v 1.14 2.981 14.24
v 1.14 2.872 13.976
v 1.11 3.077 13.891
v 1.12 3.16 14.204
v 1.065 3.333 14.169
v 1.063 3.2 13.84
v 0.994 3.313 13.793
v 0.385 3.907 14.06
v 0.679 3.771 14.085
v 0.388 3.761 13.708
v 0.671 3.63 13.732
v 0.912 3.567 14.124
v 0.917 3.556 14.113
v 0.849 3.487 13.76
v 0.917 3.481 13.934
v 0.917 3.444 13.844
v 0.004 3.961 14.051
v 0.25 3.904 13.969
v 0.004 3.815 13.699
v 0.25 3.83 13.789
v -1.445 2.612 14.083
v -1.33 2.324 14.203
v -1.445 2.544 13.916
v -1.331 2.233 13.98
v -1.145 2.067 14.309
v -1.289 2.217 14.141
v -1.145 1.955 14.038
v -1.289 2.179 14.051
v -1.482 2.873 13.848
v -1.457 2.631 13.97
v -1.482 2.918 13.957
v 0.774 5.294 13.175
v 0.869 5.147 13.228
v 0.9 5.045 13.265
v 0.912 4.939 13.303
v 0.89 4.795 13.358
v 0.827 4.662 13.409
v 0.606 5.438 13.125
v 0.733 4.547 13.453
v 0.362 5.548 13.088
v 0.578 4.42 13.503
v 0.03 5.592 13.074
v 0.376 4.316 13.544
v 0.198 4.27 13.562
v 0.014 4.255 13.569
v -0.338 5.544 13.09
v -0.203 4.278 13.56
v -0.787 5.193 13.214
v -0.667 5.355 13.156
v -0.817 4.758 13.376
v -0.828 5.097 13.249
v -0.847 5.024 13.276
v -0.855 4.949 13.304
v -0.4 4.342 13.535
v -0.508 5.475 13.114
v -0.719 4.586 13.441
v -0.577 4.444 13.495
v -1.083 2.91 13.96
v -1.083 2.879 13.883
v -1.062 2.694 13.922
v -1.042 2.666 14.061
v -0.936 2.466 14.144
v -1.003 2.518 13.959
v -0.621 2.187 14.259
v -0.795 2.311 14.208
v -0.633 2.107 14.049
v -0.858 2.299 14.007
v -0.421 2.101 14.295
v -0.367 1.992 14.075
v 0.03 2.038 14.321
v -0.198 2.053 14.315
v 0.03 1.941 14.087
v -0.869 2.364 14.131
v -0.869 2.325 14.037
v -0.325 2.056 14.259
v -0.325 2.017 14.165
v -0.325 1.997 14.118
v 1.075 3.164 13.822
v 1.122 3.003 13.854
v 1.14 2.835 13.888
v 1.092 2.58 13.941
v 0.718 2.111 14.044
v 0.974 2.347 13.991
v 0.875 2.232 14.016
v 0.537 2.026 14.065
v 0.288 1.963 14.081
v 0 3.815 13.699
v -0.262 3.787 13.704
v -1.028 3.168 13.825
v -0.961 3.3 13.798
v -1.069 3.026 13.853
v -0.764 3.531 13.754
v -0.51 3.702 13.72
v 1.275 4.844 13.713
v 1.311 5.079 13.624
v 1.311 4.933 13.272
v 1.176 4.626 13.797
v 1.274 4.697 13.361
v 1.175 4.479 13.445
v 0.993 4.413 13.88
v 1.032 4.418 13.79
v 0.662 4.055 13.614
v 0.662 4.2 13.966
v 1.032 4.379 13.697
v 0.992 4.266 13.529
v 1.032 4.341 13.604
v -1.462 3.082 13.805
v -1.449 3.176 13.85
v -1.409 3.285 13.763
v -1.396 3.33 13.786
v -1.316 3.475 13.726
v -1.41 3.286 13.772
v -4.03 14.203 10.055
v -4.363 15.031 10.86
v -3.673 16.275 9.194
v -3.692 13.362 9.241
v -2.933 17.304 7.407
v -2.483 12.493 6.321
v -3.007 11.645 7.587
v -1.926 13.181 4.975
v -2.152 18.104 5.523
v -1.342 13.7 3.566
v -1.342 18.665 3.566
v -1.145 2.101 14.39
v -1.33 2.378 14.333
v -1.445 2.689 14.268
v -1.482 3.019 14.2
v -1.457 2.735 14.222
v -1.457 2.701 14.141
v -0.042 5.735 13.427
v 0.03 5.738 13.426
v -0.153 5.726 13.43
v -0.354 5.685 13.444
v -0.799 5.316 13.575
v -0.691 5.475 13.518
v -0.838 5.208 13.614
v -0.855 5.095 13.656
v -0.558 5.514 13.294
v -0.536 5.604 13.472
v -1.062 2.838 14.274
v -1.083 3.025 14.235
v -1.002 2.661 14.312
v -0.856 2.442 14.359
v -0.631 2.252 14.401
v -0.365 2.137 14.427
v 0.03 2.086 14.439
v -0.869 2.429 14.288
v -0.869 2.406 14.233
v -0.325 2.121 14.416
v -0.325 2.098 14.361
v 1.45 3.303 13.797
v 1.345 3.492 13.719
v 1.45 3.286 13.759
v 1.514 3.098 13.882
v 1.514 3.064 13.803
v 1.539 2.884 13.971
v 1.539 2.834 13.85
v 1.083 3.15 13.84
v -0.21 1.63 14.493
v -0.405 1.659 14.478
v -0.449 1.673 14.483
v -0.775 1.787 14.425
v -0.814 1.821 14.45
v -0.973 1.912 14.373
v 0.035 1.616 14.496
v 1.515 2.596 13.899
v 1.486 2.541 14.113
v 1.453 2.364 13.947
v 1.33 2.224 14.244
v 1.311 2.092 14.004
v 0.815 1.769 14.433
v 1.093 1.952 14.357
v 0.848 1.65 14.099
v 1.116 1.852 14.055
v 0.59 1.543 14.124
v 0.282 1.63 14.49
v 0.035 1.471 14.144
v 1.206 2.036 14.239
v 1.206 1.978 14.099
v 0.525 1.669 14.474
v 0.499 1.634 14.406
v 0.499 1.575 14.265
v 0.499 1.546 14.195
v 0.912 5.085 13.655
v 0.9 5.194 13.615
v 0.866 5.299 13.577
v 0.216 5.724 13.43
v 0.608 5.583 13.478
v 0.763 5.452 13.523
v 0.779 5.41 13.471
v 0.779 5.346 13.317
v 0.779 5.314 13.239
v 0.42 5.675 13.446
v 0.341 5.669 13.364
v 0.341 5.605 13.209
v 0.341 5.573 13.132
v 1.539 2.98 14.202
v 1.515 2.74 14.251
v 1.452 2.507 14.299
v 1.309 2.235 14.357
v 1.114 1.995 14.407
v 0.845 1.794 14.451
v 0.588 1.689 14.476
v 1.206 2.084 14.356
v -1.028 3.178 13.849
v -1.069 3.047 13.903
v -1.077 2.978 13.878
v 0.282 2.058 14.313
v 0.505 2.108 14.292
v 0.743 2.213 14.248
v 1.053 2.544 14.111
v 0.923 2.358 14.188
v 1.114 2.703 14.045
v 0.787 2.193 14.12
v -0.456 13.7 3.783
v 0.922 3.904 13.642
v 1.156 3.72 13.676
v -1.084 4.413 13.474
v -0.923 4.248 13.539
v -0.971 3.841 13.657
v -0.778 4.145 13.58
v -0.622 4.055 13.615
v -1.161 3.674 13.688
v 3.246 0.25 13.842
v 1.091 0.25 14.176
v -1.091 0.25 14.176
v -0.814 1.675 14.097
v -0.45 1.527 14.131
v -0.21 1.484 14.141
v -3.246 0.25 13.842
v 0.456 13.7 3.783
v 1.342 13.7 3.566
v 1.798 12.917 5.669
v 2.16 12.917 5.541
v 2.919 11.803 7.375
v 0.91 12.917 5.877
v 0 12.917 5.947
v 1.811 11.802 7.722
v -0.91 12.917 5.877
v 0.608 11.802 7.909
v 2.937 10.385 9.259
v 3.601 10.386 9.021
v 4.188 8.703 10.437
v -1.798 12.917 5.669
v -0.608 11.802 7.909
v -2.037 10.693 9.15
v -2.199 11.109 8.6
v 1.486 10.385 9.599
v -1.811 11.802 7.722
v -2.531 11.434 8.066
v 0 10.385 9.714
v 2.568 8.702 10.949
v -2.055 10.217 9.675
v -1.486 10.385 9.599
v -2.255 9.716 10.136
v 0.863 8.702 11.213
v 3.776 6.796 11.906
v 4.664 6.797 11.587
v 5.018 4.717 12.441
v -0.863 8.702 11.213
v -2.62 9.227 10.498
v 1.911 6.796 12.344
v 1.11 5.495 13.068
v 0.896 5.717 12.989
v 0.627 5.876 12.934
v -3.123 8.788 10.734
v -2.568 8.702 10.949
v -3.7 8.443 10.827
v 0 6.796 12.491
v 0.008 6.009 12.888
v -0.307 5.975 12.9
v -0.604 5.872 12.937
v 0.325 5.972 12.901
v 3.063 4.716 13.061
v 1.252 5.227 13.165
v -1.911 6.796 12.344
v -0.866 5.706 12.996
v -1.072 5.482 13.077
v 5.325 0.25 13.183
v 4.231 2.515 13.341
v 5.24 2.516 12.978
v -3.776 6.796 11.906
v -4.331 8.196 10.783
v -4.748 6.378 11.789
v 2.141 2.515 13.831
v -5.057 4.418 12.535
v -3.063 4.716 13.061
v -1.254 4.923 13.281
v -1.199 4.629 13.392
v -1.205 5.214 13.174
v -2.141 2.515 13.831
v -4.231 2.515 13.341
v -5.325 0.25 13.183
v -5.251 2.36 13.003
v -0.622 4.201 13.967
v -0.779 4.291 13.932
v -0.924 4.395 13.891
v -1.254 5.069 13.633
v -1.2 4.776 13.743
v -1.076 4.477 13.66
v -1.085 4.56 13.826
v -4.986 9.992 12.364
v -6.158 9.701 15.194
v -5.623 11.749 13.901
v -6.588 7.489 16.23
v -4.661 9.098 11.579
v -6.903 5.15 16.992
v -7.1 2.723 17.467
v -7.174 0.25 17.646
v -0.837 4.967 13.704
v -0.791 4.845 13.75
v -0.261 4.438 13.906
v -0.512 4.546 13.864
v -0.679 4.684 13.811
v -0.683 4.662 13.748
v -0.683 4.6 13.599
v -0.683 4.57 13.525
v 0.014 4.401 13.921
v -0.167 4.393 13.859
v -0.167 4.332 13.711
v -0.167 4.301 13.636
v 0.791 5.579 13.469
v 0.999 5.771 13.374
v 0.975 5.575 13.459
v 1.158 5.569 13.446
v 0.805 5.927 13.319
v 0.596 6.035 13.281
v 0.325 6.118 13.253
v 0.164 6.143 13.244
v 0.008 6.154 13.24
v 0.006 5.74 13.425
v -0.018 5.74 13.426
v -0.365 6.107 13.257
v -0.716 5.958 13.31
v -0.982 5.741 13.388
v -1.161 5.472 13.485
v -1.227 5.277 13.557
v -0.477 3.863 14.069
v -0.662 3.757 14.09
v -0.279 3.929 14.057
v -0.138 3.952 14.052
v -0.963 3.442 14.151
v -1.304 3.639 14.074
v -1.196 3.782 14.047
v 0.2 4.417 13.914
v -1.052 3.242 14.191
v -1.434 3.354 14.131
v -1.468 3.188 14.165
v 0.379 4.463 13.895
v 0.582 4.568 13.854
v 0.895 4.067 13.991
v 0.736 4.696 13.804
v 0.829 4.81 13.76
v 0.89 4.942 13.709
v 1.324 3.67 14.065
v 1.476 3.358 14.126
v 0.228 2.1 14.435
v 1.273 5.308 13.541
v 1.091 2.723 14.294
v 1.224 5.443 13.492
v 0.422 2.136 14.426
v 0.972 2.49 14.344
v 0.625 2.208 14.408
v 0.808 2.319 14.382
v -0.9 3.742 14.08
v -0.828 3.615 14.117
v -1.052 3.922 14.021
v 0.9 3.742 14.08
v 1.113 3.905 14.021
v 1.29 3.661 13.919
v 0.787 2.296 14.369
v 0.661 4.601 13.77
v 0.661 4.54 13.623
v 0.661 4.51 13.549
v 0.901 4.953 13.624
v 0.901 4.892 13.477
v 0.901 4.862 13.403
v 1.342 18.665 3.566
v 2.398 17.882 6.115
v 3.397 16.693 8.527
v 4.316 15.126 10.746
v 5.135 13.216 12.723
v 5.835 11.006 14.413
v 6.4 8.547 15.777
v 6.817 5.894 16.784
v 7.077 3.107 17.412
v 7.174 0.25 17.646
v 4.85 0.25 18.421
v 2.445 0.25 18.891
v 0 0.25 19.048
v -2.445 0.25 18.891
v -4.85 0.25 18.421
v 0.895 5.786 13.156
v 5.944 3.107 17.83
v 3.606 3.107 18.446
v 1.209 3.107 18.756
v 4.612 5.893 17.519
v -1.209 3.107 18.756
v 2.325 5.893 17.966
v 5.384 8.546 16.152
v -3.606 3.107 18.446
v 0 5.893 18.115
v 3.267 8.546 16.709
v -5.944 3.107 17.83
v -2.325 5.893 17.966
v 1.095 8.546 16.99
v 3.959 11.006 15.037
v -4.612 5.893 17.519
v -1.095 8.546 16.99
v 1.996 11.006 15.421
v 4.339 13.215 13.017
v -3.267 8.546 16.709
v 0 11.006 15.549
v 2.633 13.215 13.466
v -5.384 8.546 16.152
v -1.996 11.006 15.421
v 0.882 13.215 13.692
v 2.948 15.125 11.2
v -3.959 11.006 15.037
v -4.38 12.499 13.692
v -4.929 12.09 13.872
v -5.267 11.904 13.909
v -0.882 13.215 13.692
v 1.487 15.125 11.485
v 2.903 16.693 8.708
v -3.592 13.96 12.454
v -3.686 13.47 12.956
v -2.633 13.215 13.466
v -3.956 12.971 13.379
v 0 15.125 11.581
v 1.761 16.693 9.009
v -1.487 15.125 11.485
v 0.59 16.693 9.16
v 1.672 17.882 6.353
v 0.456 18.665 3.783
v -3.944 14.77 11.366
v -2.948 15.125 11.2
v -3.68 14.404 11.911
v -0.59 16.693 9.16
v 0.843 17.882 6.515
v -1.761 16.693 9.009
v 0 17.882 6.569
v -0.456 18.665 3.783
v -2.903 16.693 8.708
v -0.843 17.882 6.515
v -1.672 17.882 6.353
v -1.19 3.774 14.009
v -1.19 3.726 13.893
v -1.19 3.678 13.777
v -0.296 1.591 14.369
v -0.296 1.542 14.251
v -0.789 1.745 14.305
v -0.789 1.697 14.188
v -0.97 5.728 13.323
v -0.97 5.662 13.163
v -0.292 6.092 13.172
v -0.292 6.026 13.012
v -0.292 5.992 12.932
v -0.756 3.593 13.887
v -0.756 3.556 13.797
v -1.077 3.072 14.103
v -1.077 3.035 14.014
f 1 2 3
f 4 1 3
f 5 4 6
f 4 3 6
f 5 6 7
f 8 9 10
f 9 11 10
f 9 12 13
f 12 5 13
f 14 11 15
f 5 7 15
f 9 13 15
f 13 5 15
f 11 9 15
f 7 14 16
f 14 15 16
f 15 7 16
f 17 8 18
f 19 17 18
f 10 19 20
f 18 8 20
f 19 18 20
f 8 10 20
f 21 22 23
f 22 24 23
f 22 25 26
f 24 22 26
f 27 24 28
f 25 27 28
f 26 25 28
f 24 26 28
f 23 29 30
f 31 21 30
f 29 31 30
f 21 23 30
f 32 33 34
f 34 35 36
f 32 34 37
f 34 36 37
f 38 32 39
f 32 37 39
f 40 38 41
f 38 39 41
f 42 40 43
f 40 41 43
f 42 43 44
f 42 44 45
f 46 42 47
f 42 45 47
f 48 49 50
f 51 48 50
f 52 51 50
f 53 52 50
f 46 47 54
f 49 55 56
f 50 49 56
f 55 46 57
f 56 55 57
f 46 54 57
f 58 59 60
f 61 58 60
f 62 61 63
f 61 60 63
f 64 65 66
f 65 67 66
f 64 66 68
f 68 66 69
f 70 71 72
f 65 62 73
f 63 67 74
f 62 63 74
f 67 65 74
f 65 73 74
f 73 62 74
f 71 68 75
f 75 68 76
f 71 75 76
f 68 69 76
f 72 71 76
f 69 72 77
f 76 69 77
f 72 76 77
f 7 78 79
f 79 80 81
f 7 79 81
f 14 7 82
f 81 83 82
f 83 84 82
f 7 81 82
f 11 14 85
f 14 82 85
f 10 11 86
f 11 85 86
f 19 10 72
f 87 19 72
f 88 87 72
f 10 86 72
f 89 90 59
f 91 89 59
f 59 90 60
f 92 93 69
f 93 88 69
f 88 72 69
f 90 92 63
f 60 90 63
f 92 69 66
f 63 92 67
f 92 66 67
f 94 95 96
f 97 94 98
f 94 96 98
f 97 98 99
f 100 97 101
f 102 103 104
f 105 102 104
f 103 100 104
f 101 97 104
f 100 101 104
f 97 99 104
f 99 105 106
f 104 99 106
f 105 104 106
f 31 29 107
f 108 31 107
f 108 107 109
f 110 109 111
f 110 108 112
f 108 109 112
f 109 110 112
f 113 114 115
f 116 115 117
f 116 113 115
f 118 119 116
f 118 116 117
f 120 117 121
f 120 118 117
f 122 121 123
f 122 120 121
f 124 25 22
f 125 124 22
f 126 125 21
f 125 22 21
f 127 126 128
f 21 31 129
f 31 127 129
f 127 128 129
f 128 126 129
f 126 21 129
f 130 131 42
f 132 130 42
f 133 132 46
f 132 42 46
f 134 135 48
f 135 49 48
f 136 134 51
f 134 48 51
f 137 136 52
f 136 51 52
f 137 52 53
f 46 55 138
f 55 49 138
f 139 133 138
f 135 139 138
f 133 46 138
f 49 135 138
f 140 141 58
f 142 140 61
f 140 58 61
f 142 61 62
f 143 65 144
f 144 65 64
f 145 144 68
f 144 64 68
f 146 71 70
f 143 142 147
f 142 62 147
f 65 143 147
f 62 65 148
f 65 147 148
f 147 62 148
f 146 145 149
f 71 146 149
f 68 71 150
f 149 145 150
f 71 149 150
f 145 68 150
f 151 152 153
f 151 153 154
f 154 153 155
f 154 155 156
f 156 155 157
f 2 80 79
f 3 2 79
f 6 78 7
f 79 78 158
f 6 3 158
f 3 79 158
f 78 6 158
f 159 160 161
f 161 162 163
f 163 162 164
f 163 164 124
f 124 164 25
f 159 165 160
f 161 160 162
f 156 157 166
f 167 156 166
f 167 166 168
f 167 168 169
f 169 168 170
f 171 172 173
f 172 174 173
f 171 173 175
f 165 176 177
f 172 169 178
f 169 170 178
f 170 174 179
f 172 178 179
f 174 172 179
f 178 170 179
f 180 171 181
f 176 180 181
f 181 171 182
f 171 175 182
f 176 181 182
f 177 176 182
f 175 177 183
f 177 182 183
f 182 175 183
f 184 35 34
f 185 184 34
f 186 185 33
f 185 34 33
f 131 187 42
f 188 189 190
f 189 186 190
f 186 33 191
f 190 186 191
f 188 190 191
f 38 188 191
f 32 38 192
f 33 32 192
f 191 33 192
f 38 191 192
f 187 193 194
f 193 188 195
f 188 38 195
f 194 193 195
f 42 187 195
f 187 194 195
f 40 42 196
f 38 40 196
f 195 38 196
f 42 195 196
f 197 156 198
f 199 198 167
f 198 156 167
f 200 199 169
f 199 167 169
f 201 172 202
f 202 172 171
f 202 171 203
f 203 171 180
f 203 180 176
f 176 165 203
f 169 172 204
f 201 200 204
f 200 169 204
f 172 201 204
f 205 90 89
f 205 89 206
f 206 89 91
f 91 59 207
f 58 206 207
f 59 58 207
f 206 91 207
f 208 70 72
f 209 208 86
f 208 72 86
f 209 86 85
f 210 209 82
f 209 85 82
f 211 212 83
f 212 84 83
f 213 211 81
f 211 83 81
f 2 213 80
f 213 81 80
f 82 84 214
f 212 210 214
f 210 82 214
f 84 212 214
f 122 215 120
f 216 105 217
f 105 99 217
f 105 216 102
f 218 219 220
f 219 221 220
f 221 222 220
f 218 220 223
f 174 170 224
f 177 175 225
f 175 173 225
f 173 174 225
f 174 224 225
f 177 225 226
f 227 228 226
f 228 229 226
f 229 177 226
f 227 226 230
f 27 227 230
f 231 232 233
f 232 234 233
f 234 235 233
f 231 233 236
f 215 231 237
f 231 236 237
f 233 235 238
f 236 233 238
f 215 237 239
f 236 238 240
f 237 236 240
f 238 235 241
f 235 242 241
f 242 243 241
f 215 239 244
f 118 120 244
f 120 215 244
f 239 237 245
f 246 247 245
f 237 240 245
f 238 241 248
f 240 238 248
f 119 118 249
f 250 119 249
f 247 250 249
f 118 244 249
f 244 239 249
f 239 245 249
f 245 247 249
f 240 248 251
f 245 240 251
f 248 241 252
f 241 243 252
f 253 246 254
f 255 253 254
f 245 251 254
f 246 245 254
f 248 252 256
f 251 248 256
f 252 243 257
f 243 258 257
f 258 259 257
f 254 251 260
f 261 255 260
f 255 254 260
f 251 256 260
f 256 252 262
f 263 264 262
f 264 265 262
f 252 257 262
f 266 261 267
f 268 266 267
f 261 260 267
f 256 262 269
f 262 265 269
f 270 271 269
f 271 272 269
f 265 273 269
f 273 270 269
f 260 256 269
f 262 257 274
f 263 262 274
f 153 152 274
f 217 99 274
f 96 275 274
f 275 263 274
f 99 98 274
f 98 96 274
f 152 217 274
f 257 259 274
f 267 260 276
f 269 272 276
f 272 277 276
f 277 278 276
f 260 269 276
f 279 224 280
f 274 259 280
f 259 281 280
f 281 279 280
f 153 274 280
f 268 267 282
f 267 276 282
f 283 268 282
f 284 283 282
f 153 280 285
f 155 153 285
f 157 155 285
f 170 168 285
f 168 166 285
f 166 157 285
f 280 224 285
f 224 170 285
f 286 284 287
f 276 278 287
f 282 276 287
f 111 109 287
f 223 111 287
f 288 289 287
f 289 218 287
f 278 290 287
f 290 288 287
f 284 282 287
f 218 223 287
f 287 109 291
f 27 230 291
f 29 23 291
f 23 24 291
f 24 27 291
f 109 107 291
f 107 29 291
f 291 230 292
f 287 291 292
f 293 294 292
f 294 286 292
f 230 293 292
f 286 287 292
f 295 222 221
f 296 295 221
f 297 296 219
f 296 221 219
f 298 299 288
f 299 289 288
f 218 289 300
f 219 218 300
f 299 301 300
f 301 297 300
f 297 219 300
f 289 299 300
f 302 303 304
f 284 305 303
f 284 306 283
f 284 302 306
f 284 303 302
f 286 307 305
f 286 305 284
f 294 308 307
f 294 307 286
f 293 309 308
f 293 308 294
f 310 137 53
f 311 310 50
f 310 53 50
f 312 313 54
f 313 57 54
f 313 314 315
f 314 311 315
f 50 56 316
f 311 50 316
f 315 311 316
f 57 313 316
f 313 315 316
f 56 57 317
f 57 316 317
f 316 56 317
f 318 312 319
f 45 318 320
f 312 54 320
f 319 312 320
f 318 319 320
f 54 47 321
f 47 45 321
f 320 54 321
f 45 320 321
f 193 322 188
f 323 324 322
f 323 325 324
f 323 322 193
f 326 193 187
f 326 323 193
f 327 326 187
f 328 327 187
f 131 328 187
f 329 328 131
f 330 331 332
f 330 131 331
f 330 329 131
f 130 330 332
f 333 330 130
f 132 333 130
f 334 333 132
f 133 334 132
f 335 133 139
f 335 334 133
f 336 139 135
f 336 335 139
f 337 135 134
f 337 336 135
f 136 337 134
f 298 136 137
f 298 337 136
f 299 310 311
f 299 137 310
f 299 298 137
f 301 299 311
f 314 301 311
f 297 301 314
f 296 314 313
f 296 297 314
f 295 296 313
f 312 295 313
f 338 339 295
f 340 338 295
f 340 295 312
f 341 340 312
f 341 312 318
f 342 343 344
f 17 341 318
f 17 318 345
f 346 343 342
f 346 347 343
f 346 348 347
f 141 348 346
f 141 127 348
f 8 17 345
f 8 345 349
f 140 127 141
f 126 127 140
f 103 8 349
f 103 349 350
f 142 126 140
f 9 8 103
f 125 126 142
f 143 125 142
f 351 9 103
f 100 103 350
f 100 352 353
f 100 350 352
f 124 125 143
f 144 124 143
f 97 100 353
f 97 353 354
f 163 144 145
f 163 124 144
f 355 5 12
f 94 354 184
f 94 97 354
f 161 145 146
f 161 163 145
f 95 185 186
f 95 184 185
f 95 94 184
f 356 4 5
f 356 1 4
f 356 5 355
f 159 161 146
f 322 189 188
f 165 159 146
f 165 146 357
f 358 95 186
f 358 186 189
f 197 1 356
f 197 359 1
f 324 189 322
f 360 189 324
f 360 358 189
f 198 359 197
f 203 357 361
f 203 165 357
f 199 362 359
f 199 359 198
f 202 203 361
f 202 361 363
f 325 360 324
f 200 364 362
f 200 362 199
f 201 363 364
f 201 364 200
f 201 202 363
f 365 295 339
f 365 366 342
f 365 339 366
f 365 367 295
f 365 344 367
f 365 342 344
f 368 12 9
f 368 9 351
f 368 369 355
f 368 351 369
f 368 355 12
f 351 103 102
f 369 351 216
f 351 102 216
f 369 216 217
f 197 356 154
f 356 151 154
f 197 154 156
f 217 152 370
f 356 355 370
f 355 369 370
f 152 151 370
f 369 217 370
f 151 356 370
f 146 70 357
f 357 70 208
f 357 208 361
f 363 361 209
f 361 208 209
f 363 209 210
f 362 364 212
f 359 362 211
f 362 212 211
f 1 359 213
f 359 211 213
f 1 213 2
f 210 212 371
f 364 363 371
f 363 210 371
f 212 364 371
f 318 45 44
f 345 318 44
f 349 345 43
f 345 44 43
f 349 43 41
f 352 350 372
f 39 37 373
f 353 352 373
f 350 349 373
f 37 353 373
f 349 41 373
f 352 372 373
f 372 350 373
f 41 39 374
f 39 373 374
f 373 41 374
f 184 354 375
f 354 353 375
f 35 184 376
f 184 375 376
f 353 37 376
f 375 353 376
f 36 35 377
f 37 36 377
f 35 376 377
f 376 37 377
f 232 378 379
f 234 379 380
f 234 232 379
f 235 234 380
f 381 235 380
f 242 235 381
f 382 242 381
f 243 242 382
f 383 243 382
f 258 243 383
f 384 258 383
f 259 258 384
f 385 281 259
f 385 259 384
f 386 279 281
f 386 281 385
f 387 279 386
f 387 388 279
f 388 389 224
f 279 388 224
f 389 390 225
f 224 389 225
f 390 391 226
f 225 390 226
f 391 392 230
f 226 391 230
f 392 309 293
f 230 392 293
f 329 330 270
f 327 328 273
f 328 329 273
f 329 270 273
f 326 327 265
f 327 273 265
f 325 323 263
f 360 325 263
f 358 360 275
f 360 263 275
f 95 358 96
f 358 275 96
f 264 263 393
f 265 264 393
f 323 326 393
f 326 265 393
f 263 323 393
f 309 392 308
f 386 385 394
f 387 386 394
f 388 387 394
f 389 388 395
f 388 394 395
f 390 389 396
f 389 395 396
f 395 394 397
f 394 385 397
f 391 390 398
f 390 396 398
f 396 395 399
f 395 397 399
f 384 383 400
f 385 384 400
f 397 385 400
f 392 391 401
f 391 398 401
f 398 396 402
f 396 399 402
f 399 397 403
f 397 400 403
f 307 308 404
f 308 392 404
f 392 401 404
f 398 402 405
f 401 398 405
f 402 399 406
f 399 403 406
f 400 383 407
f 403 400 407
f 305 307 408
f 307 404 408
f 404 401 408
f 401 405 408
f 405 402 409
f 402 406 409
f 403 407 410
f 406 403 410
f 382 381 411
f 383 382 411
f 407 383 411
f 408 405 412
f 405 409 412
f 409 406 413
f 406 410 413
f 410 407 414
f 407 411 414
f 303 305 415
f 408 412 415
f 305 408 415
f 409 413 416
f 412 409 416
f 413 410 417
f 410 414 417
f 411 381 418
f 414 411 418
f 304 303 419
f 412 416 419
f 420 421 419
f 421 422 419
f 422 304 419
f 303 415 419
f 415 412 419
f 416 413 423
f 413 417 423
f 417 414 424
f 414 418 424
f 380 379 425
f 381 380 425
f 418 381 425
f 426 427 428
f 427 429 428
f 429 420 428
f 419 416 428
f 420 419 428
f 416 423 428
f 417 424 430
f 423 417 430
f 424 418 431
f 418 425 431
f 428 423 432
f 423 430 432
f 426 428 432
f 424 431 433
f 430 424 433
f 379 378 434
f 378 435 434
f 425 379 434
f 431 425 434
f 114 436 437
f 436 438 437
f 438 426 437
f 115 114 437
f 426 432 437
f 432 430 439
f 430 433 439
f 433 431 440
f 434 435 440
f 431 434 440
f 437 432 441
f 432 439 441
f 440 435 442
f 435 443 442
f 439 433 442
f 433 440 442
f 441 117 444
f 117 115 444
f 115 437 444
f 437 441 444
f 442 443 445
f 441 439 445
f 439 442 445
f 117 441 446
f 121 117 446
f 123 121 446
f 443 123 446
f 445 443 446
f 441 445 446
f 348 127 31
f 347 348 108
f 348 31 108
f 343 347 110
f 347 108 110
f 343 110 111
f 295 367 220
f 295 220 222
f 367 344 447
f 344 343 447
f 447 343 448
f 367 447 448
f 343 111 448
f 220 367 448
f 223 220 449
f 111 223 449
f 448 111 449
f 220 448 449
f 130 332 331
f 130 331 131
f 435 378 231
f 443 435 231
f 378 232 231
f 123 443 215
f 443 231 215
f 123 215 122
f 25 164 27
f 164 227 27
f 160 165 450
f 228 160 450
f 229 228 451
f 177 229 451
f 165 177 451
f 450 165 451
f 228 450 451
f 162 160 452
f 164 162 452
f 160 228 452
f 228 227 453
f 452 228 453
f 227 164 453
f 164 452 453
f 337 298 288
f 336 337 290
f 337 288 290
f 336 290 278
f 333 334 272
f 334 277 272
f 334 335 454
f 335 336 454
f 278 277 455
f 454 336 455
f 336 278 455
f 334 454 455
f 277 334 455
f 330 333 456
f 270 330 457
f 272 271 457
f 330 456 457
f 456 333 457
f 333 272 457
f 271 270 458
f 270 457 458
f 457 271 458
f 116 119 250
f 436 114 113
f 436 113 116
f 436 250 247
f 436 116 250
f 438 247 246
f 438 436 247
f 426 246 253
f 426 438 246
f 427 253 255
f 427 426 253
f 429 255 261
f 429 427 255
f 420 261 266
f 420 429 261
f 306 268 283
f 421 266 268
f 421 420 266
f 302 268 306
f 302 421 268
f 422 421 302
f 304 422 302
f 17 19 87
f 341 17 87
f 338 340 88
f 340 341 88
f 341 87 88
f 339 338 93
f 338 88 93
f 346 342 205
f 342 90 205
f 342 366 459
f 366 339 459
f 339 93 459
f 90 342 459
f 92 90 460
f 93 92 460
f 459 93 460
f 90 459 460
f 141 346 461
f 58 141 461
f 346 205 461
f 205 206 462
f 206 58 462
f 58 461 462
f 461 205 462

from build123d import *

# Parameters (mm, degrees)
REVOLVE1_ANGLE          = 45
CUT_EXTRUDE1_DEPTH      = 28.647117169
CUT_EXTRUDE1_DEPTH_BACK = 28.647117169
CUT_EXTRUDE4_START      = 8.537277035
CUT_EXTRUDE4_DEPTH      = 5.473576564
CUT_EXTRUDE4_START_2    = 14.010853599
CUT_EXTRUDE4_2_DEPTH    = 0.589178544
CUT_EXTRUDE5_DEPTH      = 28.732730484
CUT_EXTRUDE5_DEPTH_BACK = 28.732730484
SKETCH9_R               = 2.6035


with BuildPart() as part:
    # Sketch1 → Revolve1 (revolve, symmetric)
    with BuildSketch(Plane(origin=(0, 0, 0), x_dir=(0, 0, -1), z_dir=(1, 0, 0))) as revolve1_sk:
        with BuildLine():
            Line((-14.217802221, 0.25), (-19.048359509, 0.25))
            ThreePointArc((-19.048359509, 0.25), (-14.676690222, 12.144845166), (-3.81, 18.66511184))
            Line((-3.81, 18.66511184), (-3.81, 13.700083941))
            ThreePointArc((-3.81, 13.700083941), (-11.246181696, 8.70240181), (-14.217802221, 0.25))
        make_face()
    revolve(axis=Axis((0, 0, 0), (0, 1, 0)), revolution_arc=REVOLVE1_ANGLE / 2)
    revolve(revolve1_sk.sketch, axis=Axis((0, 0, 0), (0, -1, 0)), revolution_arc=REVOLVE1_ANGLE / 2)

    # Sketch2 → Cut-Extrude1 (cut, two sides: drawn at the far end of the back side and taken through both)
    with BuildSketch(Plane(origin=(0, 0, 0), x_dir=(1, 0, 0), z_dir=(0, 1, 0)).offset(-CUT_EXTRUDE1_DEPTH_BACK)):
        with BuildLine():
            Line((7.289491598, -17.598389479), (1.458023877, -3.519981019))
            ThreePointArc((1.458023877, -3.519981019), (1.400077392, -3.543428184), (1.341754023, -3.5659215))
            Line((1.341754023, -3.5659215), (7.173849701, -17.645845983))
            ThreePointArc((7.173849701, -17.645845983), (7.231709577, -17.622212591), (7.289491598, -17.598389479))
        make_face()
        with BuildLine():
            Line((-7.173849701, -17.645845983), (-1.341754023, -3.5659215))
            ThreePointArc((-1.341754023, -3.5659215), (-1.400077392, -3.543428184), (-1.458023877, -3.519981019))
            Line((-1.458023877, -3.519981019), (-7.289491598, -17.598389479))
            ThreePointArc((-7.289491598, -17.598389479), (-7.231709577, -17.622212591), (-7.173849701, -17.645845983))
        make_face()
    extrude(amount=CUT_EXTRUDE1_DEPTH + CUT_EXTRUDE1_DEPTH_BACK, mode=Mode.SUBTRACT)

    # Cut-Extrude4: read off the stored shape, not the designer's step
    # Cut-Extrude4 outline → Cut-Extrude4 (cut)
    with BuildSketch(Plane(origin=(0, 0, 0), x_dir=(-1, 0, 0), z_dir=(0, 0.3826834323650899, 0.9238795325112868)).offset(CUT_EXTRUDE4_START)):
        with BuildLine():
            add(Edge.make_bspline(
                [(1.145086138, 3.565969106), (1.19745992, 3.501753358), (1.247244242, 3.434878944), (1.289054738, 3.363552137), (1.36987604, 3.225674665), (1.42881214, 3.072360327), (1.457196317, 2.91577175), (1.47334903, 2.826661179), (1.4796055, 2.735818699), (1.481666667, 2.645269988)],
                knots=[0, 0, 0, 0, 0.246790042, 0.246790042, 0.246790042, 0.728901446, 0.728901446, 0.728901446, 1, 1, 1, 1], degree=3))
            add(Edge.make_bspline(
                [(-0.034726562, 4.053921831), (0.07575388, 4.051019144), (0.186778995, 4.046395579), (0.295874255, 4.028901651), (0.467443739, 4.001389693), (0.637906375, 3.946400478), (0.789002935, 3.861831747), (0.924097327, 3.786219427), (1.04145298, 3.67986749), (1.145086138, 3.565969106)],
                knots=[0, 0, 0, 0, 0.249295942, 0.249295942, 0.249295942, 0.645680683, 0.645680683, 0.645680683, 1, 1, 1, 1], degree=3))
            add(Edge.make_bspline(
                [(-1.538653846, 2.681777399), (-1.533984641, 2.841390676), (-1.509995079, 3.003784016), (-1.452444081, 3.153169647), (-1.394735889, 3.302963304), (-1.308458263, 3.44367736), (-1.206069907, 3.568297055), (-1.117554458, 3.676031652), (-1.011064819, 3.772567587), (-0.891455892, 3.845919508), (-0.771642392, 3.919396885), (-0.636486792, 3.970759294), (-0.499275438, 4.003497061), (-0.34783736, 4.039629235), (-0.190448958, 4.050094147), (-0.034726562, 4.053921831)],
                knots=[0, 0, 0, 0, 0.213488165, 0.213488165, 0.213488165, 0.426876737, 0.426876737, 0.426876737, 0.611615857, 0.611615857, 0.611615857, 0.79654204, 0.79654204, 0.79654204, 1, 1, 1, 1], degree=3))
            add(Edge.make_bspline(
                [(-0.661585537, 1.463676438), (-0.899774904, 1.586484198), (-1.128226559, 1.734488753), (-1.451046171, 2.153494958), (-1.532392107, 2.415727364), (-1.538653846, 2.681777399)],
                knots=[0, 0, 0, 0, 0.5, 0.5, 1, 1, 1, 1], degree=3))
            add(Edge.make_bspline(
                [(-1.310705128, 0.521607127), (-1.305904516, 0.65367332), (-1.280862157, 0.788593254), (-1.226377368, 0.909035745), (-1.178829711, 1.014143213), (-1.111903507, 1.112084922), (-1.032368876, 1.195678848), (-0.952782866, 1.279326774), (-0.859002662, 1.350529079), (-0.759375758, 1.408896603), (-0.727137868, 1.427783528), (-0.694356407, 1.445732495), (-0.661585537, 1.463676438)],
                knots=[0, 0, 0, 0, 0.332551925, 0.332551925, 0.332551925, 0.620515921, 0.620515921, 0.620515921, 0.907833434, 0.907833434, 0.907833434, 1, 1, 1, 1], degree=3))
            add(Edge.make_bspline(
                [(-0.008013822, -0.619026887), (-0.329093033, -0.609182757), (-0.647556074, -0.51508889), (-1.142511109, -0.108023215), (-1.296474915, 0.197661831), (-1.310705128, 0.521607127)],
                knots=[0, 0, 0, 0, 0.5, 0.5, 1, 1, 1, 1], degree=3))
            add(Edge.make_bspline(
                [(1.253717949, 0.534073073), (1.248106847, 0.402186726), (1.226592659, 0.268072734), (1.177956097, 0.145346109), (1.129145328, 0.022179899), (1.058406248, -0.094576574), (0.970426594, -0.19366506), (0.885346609, -0.289487746), (0.783549843, -0.372494682), (0.672886827, -0.437179025), (0.555024512, -0.506071477), (0.425013252, -0.557408464), (0.291775846, -0.587329089), (0.19373517, -0.609345716), (0.092421842, -0.615777022), (-0.008013822, -0.619026887)],
                knots=[0, 0, 0, 0, 0.21068445, 0.21068445, 0.21068445, 0.421636468, 0.421636468, 0.421636468, 0.625019757, 0.625019757, 0.625019757, 0.841526684, 0.841526684, 0.841526684, 1, 1, 1, 1], degree=3))
            add(Edge.make_bspline(
                [(0.622406851, 1.463676438), (0.794872438, 1.366288738), (0.958485385, 1.250710522), (1.193364369, 0.930775301), (1.246147584, 0.733258349), (1.253717949, 0.534073073)],
                knots=[0, 0, 0, 0, 0.5, 0.5, 1, 1, 1, 1], degree=3))
            add(Edge.make_bspline(
                [(1.481666667, 2.645269988), (1.477900568, 2.506257325), (1.458307011, 2.364648218), (1.409828968, 2.234085494), (1.360959813, 2.102469417), (1.284712252, 1.978252529), (1.189539786, 1.874109185), (1.068614249, 1.741785305), (0.920513154, 1.632246696), (0.764629517, 1.541288113), (0.718017874, 1.514090075), (0.670244168, 1.488815415), (0.622406851, 1.463676438)],
                knots=[0, 0, 0, 0, 0.272687597, 0.272687597, 0.272687597, 0.548164245, 0.548164245, 0.548164245, 0.896722367, 0.896722367, 0.896722367, 1, 1, 1, 1], degree=3))
        make_face()
        with BuildLine():
            add(Edge.make_bspline(
                [(-0.030274439, -0.163129452), (0.176574569, -0.158842716), (0.390032776, -0.127065887), (0.726671431, 0.112992678), (0.84816771, 0.307402482), (0.854807692, 0.518935853)],
                knots=[0, 0, 0, 0, 0.5, 0.5, 1, 1, 1, 1], degree=3))
            add(Edge.make_bspline(
                [(-0.911794872, 0.5278401), (-0.910378196, 0.461413058), (-0.899959463, 0.394094746), (-0.877901666, 0.331432281), (-0.855739467, 0.268473225), (-0.820498486, 0.209611521), (-0.778994043, 0.157340082), (-0.724231937, 0.088371705), (-0.655439967, 0.02939478), (-0.580836785, -0.017457561), (-0.506927182, -0.063874318), (-0.425458077, -0.100005398), (-0.341342733, -0.123398581), (-0.240648007, -0.151402628), (-0.134776636, -0.160365623), (-0.030274439, -0.163129452)],
                knots=[0, 0, 0, 0, 0.160427029, 0.160427029, 0.160427029, 0.321911318, 0.321911318, 0.321911318, 0.535779581, 0.535779581, 0.535779581, 0.747081473, 0.747081473, 0.747081473, 1, 1, 1, 1], degree=3))
            add(Edge.make_bspline(
                [(-0.014246795, 1.261550036), (-0.131042531, 1.258899944), (-0.250301822, 1.242809941), (-0.35950973, 1.201320714), (-0.46932602, 1.159600356), (-0.572837351, 1.096294942), (-0.660664627, 1.018289451), (-0.726352616, 0.959947394), (-0.78704119, 0.893280481), (-0.831209505, 0.817346662), (-0.8635483, 0.761750061), (-0.888278804, 0.700506224), (-0.900975083, 0.637472986), (-0.908226779, 0.601470474), (-0.910366848, 0.564534058), (-0.911794872, 0.5278401)],
                knots=[0, 0, 0, 0, 0.277542706, 0.277542706, 0.277542706, 0.556244576, 0.556244576, 0.556244576, 0.763368873, 0.763368873, 0.763368873, 0.914507238, 0.914507238, 0.914507238, 1, 1, 1, 1], degree=3))
            add(Edge.make_bspline(
                [(0.854807692, 0.518935853), (0.851059403, 0.598014432), (0.837417497, 0.678612401), (0.806387963, 0.751464013), (0.775422194, 0.824165914), (0.7336594, 0.89322838), (0.683069938, 0.953947492), (0.624552137, 1.024182453), (0.551669227, 1.083890883), (0.472635772, 1.129864493), (0.378451012, 1.18465159), (0.273659741, 1.22422906), (0.166691144, 1.244996806), (0.107237369, 1.256539642), (0.046291764, 1.259782899), (-0.014246795, 1.261550036)],
                knots=[0, 0, 0, 0, 0.190004067, 0.190004067, 0.190004067, 0.377891327, 0.377891327, 0.377891327, 0.596386864, 0.596386864, 0.596386864, 0.85665725, 0.85665725, 0.85665725, 1, 1, 1, 1], degree=3))
        make_face(mode=Mode.SUBTRACT)
        with BuildLine():
            add(Edge.make_bspline(
                [(-0.004452123, 1.717447472), (0.132632023, 1.720491033), (0.272405968, 1.738369237), (0.40113931, 1.784614637), (0.530887425, 1.831224577), (0.652811922, 1.904568261), (0.756086449, 1.994555749), (0.848976601, 2.075494889), (0.931308921, 2.1720404), (0.988858248, 2.280069612), (1.034817886, 2.366343142), (1.066797145, 2.462204933), (1.077073442, 2.559176199), (1.080385662, 2.590431638), (1.081573452, 2.621891168), (1.08275641, 2.65328381)],
                knots=[0, 0, 0, 0, 0.258744787, 0.258744787, 0.258744787, 0.519906858, 0.519906858, 0.519906858, 0.75422633, 0.75422633, 0.75422633, 0.940929049, 0.940929049, 0.940929049, 1, 1, 1, 1], degree=3))
            add(Edge.make_bspline(
                [(-1.13974359, 2.69513377), (-1.136169754, 2.59050849), (-1.120505423, 2.483937307), (-1.082652756, 2.386143186), (-1.044603899, 2.287842196), (-0.98671476, 2.195774251), (-0.917191359, 2.115830308), (-0.83143774, 2.017223475), (-0.727870947, 1.93048768), (-0.61293256, 1.866430444), (-0.501217868, 1.804169832), (-0.376661899, 1.760583309), (-0.250098152, 1.738548265), (-0.169177452, 1.724459783), (-0.086637973, 1.718909751), (-0.004452123, 1.717447472)],
                knots=[0, 0, 0, 0, 0.192044482, 0.192044482, 0.192044482, 0.384877418, 0.384877418, 0.384877418, 0.622856126, 0.622856126, 0.622856126, 0.853849591, 0.853849591, 0.853849591, 1, 1, 1, 1], degree=3))
            add(Edge.make_bspline(
                [(-0.030274439, 3.598024395), (-0.298573697, 3.591863177), (-0.570919773, 3.536651882), (-1.003008436, 3.218062583), (-1.127994918, 2.961046631), (-1.13974359, 2.69513377)],
                knots=[0, 0, 0, 0, 0.5, 0.5, 1, 1, 1, 1], degree=3))
            add(Edge.make_bspline(
                [(1.08275641, 2.65328381), (1.080255845, 2.755933686), (1.064947857, 2.860435386), (1.028329484, 2.956666448), (0.991574424, 3.053256715), (0.936196487, 3.144358219), (0.868885383, 3.223519144), (0.802139825, 3.30201496), (0.723848366, 3.373124744), (0.635864809, 3.427749398), (0.540657955, 3.486858642), (0.434210654, 3.530809684), (0.324977495, 3.557527657), (0.209271231, 3.585828924), (0.088905226, 3.595709256), (-0.030274439, 3.598024395)],
                knots=[0, 0, 0, 0, 0.192546627, 0.192546627, 0.192546627, 0.385457207, 0.385457207, 0.385457207, 0.576178648, 0.576178648, 0.576178648, 0.782445059, 0.782445059, 0.782445059, 1, 1, 1, 1], degree=3))
        make_face(mode=Mode.SUBTRACT)
    extrude(amount=CUT_EXTRUDE4_DEPTH, mode=Mode.SUBTRACT)

    # Cut-Extrude4 2 outline → Cut-Extrude4 2 (cut)
    with BuildSketch(Plane(origin=(0, 0, 0), x_dir=(1, 0, 0), z_dir=(0, 0.38268343236508984, 0.9238795325112867)).offset(CUT_EXTRUDE4_START_2)):
        with BuildLine():
            add(Edge.make_bspline(
                [(-1.145086138, -3.565969106), (-1.19745992, -3.501753358), (-1.247244242, -3.434878944), (-1.289054738, -3.363552137), (-1.36987604, -3.225674665), (-1.42881214, -3.072360327), (-1.457196317, -2.91577175), (-1.47334903, -2.826661179), (-1.4796055, -2.735818699), (-1.481666667, -2.645269988)],
                knots=[0, 0, 0, 0, 0.246790042, 0.246790042, 0.246790042, 0.728901446, 0.728901446, 0.728901446, 1, 1, 1, 1], degree=3))
            add(Edge.make_bspline(
                [(0.034726562, -4.053921831), (-0.07575388, -4.051019144), (-0.186778995, -4.046395579), (-0.295874255, -4.028901651), (-0.467443739, -4.001389693), (-0.637906375, -3.946400478), (-0.789002935, -3.861831747), (-0.924097327, -3.786219427), (-1.04145298, -3.67986749), (-1.145086138, -3.565969106)],
                knots=[0, 0, 0, 0, 0.249295942, 0.249295942, 0.249295942, 0.645680683, 0.645680683, 0.645680683, 1, 1, 1, 1], degree=3))
            add(Edge.make_bspline(
                [(1.538653846, -2.681777399), (1.533984641, -2.841390676), (1.509995079, -3.003784016), (1.452444081, -3.153169647), (1.394735889, -3.302963304), (1.308458263, -3.44367736), (1.206069907, -3.568297055), (1.117554458, -3.676031652), (1.011064819, -3.772567587), (0.891455892, -3.845919508), (0.771642392, -3.919396885), (0.636486792, -3.970759294), (0.499275438, -4.003497061), (0.34783736, -4.039629235), (0.190448958, -4.050094147), (0.034726562, -4.053921831)],
                knots=[0, 0, 0, 0, 0.213488165, 0.213488165, 0.213488165, 0.426876737, 0.426876737, 0.426876737, 0.611615857, 0.611615857, 0.611615857, 0.79654204, 0.79654204, 0.79654204, 1, 1, 1, 1], degree=3))
            add(Edge.make_bspline(
                [(0.661585537, -1.463676438), (0.899774904, -1.586484198), (1.128226559, -1.734488753), (1.451046171, -2.153494958), (1.532392107, -2.415727364), (1.538653846, -2.681777399)],
                knots=[0, 0, 0, 0, 0.5, 0.5, 1, 1, 1, 1], degree=3))
            add(Edge.make_bspline(
                [(1.310705128, -0.521607127), (1.305904516, -0.65367332), (1.280862157, -0.788593254), (1.226377368, -0.909035745), (1.178829711, -1.014143213), (1.111903507, -1.112084922), (1.032368876, -1.195678848), (0.952782866, -1.279326774), (0.859002662, -1.350529079), (0.759375758, -1.408896603), (0.727137868, -1.427783528), (0.694356407, -1.445732495), (0.661585537, -1.463676438)],
                knots=[0, 0, 0, 0, 0.332551925, 0.332551925, 0.332551925, 0.620515921, 0.620515921, 0.620515921, 0.907833434, 0.907833434, 0.907833434, 1, 1, 1, 1], degree=3))
            add(Edge.make_bspline(
                [(0.008013822, 0.619026887), (0.329093033, 0.609182757), (0.647556074, 0.51508889), (1.142511109, 0.108023215), (1.296474915, -0.197661831), (1.310705128, -0.521607127)],
                knots=[0, 0, 0, 0, 0.5, 0.5, 1, 1, 1, 1], degree=3))
            add(Edge.make_bspline(
                [(-1.253717949, -0.534073073), (-1.248106847, -0.402186726), (-1.226592659, -0.268072734), (-1.177956097, -0.145346109), (-1.129145328, -0.022179899), (-1.058406248, 0.094576574), (-0.970426594, 0.19366506), (-0.885346609, 0.289487746), (-0.783549843, 0.372494682), (-0.672886827, 0.437179025), (-0.555024512, 0.506071477), (-0.425013252, 0.557408464), (-0.291775846, 0.587329089), (-0.19373517, 0.609345716), (-0.092421842, 0.615777022), (0.008013822, 0.619026887)],
                knots=[0, 0, 0, 0, 0.21068445, 0.21068445, 0.21068445, 0.421636468, 0.421636468, 0.421636468, 0.625019757, 0.625019757, 0.625019757, 0.841526684, 0.841526684, 0.841526684, 1, 1, 1, 1], degree=3))
            add(Edge.make_bspline(
                [(-0.622406851, -1.463676438), (-0.794872438, -1.366288738), (-0.958485385, -1.250710522), (-1.193364369, -0.930775301), (-1.246147584, -0.733258349), (-1.253717949, -0.534073073)],
                knots=[0, 0, 0, 0, 0.5, 0.5, 1, 1, 1, 1], degree=3))
            add(Edge.make_bspline(
                [(-1.481666667, -2.645269988), (-1.477900568, -2.506257325), (-1.458307011, -2.364648218), (-1.409828968, -2.234085494), (-1.360959813, -2.102469417), (-1.284712252, -1.978252529), (-1.189539786, -1.874109185), (-1.068614249, -1.741785305), (-0.920513154, -1.632246696), (-0.764629517, -1.541288113), (-0.718017874, -1.514090075), (-0.670244168, -1.488815415), (-0.622406851, -1.463676438)],
                knots=[0, 0, 0, 0, 0.272687597, 0.272687597, 0.272687597, 0.548164245, 0.548164245, 0.548164245, 0.896722367, 0.896722367, 0.896722367, 1, 1, 1, 1], degree=3))
        make_face()
        with BuildLine():
            add(Edge.make_bspline(
                [(0.004452123, -1.717447472), (-0.132632023, -1.720491033), (-0.272405968, -1.738369237), (-0.40113931, -1.784614637), (-0.530887425, -1.831224577), (-0.652811922, -1.904568261), (-0.756086449, -1.994555749), (-0.848976601, -2.075494889), (-0.931308921, -2.1720404), (-0.988858248, -2.280069612), (-1.034817886, -2.366343142), (-1.066797145, -2.462204933), (-1.077073442, -2.559176199), (-1.080385662, -2.590431638), (-1.081573452, -2.621891168), (-1.08275641, -2.65328381)],
                knots=[0, 0, 0, 0, 0.258744787, 0.258744787, 0.258744787, 0.519906858, 0.519906858, 0.519906858, 0.75422633, 0.75422633, 0.75422633, 0.940929049, 0.940929049, 0.940929049, 1, 1, 1, 1], degree=3))
            add(Edge.make_bspline(
                [(1.13974359, -2.69513377), (1.136169754, -2.59050849), (1.120505423, -2.483937307), (1.082652756, -2.386143186), (1.044603899, -2.287842196), (0.98671476, -2.195774251), (0.917191359, -2.115830308), (0.83143774, -2.017223475), (0.727870947, -1.93048768), (0.61293256, -1.866430444), (0.501217868, -1.804169832), (0.376661899, -1.760583309), (0.250098152, -1.738548265), (0.169177452, -1.724459783), (0.086637973, -1.718909751), (0.004452123, -1.717447472)],
                knots=[0, 0, 0, 0, 0.192044482, 0.192044482, 0.192044482, 0.384877418, 0.384877418, 0.384877418, 0.622856126, 0.622856126, 0.622856126, 0.853849591, 0.853849591, 0.853849591, 1, 1, 1, 1], degree=3))
            add(Edge.make_bspline(
                [(0.030274439, -3.598024395), (0.298573697, -3.591863177), (0.570919773, -3.536651882), (1.003008436, -3.218062583), (1.127994918, -2.961046631), (1.13974359, -2.69513377)],
                knots=[0, 0, 0, 0, 0.5, 0.5, 1, 1, 1, 1], degree=3))
            add(Edge.make_bspline(
                [(-1.08275641, -2.65328381), (-1.080255845, -2.755933686), (-1.064947857, -2.860435386), (-1.028329484, -2.956666448), (-0.991574424, -3.053256715), (-0.936196487, -3.144358219), (-0.868885383, -3.223519144), (-0.802139825, -3.30201496), (-0.723848366, -3.373124744), (-0.635864809, -3.427749398), (-0.540657955, -3.486858642), (-0.434210654, -3.530809684), (-0.324977495, -3.557527657), (-0.209271231, -3.585828924), (-0.088905226, -3.595709256), (0.030274439, -3.598024395)],
                knots=[0, 0, 0, 0, 0.192546627, 0.192546627, 0.192546627, 0.385457207, 0.385457207, 0.385457207, 0.576178648, 0.576178648, 0.576178648, 0.782445059, 0.782445059, 0.782445059, 1, 1, 1, 1], degree=3))
        make_face(mode=Mode.SUBTRACT)
        with BuildLine():
            add(Edge.make_bspline(
                [(0.030274439, 0.163129452), (-0.176574569, 0.158842716), (-0.390032776, 0.127065887), (-0.726671431, -0.112992678), (-0.84816771, -0.307402482), (-0.854807692, -0.518935853)],
                knots=[0, 0, 0, 0, 0.5, 0.5, 1, 1, 1, 1], degree=3))
            add(Edge.make_bspline(
                [(0.911794872, -0.5278401), (0.910378196, -0.461413058), (0.899959463, -0.394094746), (0.877901666, -0.331432281), (0.855739467, -0.268473225), (0.820498486, -0.209611521), (0.778994043, -0.157340082), (0.724231937, -0.088371705), (0.655439967, -0.02939478), (0.580836785, 0.017457561), (0.506927182, 0.063874318), (0.425458077, 0.100005398), (0.341342733, 0.123398581), (0.240648007, 0.151402628), (0.134776636, 0.160365623), (0.030274439, 0.163129452)],
                knots=[0, 0, 0, 0, 0.160427029, 0.160427029, 0.160427029, 0.321911318, 0.321911318, 0.321911318, 0.535779581, 0.535779581, 0.535779581, 0.747081473, 0.747081473, 0.747081473, 1, 1, 1, 1], degree=3))
            add(Edge.make_bspline(
                [(0.014246795, -1.261550036), (0.131042531, -1.258899944), (0.250301822, -1.242809941), (0.35950973, -1.201320714), (0.46932602, -1.159600356), (0.572837351, -1.096294942), (0.660664627, -1.018289451), (0.726352616, -0.959947394), (0.78704119, -0.893280481), (0.831209505, -0.817346662), (0.8635483, -0.761750061), (0.888278804, -0.700506224), (0.900975083, -0.637472986), (0.908226779, -0.601470474), (0.910366848, -0.564534058), (0.911794872, -0.5278401)],
                knots=[0, 0, 0, 0, 0.277542706, 0.277542706, 0.277542706, 0.556244576, 0.556244576, 0.556244576, 0.763368873, 0.763368873, 0.763368873, 0.914507238, 0.914507238, 0.914507238, 1, 1, 1, 1], degree=3))
            add(Edge.make_bspline(
                [(-0.854807692, -0.518935853), (-0.851059403, -0.598014432), (-0.837417497, -0.678612401), (-0.806387963, -0.751464013), (-0.775422194, -0.824165914), (-0.7336594, -0.89322838), (-0.683069938, -0.953947492), (-0.624552137, -1.024182453), (-0.551669227, -1.083890883), (-0.472635772, -1.129864493), (-0.378451012, -1.18465159), (-0.273659741, -1.22422906), (-0.166691144, -1.244996806), (-0.107237369, -1.256539642), (-0.046291764, -1.259782899), (0.014246795, -1.261550036)],
                knots=[0, 0, 0, 0, 0.190004067, 0.190004067, 0.190004067, 0.377891327, 0.377891327, 0.377891327, 0.596386864, 0.596386864, 0.596386864, 0.85665725, 0.85665725, 0.85665725, 1, 1, 1, 1], degree=3))
        make_face(mode=Mode.SUBTRACT)
    extrude(amount=CUT_EXTRUDE4_2_DEPTH, mode=Mode.SUBTRACT)

    # Cut-Extrude4 3 outline → Cut-Extrude4 3 (revolve)
    with BuildSketch(Plane(origin=(0, 0, 0), x_dir=(1, 0, 0), z_dir=(0, -0.9238795325112867, 0.38268343236508984))):
        with BuildLine():
            ThreePointArc((0.162359306, 14.600073087), (2.128700501, 14.440766505), (4.054070901, 14.010853599))
            Line((4.054070901, 14.010853599), (4.054070901, 14.600073087))
            Line((4.054070901, 14.600073087), (0.162359306, 14.600073087))
        make_face()
    revolve(axis=Axis((0, 0, 0), (0, 0.38268343236508984, 0.9238795325112867)))

    # Sketch9 → Cut-Extrude5 (cut, two sides: drawn at the far end of the back side and taken through both)
    with BuildSketch(Plane(origin=(-8.561597025, 18.858537854, 16.803080265), x_dir=(-0.947072496207715, -0.23968096505676023, -0.21355730358933597), z_dir=(0.3210197609601124, -0.7071067811865475, -0.6300367553350459)).offset(-CUT_EXTRUDE5_DEPTH_BACK)):
        Circle(SKETCH9_R)
    extrude(amount=CUT_EXTRUDE5_DEPTH + CUT_EXTRUDE5_DEPTH_BACK, mode=Mode.SUBTRACT)


solid = part.part
